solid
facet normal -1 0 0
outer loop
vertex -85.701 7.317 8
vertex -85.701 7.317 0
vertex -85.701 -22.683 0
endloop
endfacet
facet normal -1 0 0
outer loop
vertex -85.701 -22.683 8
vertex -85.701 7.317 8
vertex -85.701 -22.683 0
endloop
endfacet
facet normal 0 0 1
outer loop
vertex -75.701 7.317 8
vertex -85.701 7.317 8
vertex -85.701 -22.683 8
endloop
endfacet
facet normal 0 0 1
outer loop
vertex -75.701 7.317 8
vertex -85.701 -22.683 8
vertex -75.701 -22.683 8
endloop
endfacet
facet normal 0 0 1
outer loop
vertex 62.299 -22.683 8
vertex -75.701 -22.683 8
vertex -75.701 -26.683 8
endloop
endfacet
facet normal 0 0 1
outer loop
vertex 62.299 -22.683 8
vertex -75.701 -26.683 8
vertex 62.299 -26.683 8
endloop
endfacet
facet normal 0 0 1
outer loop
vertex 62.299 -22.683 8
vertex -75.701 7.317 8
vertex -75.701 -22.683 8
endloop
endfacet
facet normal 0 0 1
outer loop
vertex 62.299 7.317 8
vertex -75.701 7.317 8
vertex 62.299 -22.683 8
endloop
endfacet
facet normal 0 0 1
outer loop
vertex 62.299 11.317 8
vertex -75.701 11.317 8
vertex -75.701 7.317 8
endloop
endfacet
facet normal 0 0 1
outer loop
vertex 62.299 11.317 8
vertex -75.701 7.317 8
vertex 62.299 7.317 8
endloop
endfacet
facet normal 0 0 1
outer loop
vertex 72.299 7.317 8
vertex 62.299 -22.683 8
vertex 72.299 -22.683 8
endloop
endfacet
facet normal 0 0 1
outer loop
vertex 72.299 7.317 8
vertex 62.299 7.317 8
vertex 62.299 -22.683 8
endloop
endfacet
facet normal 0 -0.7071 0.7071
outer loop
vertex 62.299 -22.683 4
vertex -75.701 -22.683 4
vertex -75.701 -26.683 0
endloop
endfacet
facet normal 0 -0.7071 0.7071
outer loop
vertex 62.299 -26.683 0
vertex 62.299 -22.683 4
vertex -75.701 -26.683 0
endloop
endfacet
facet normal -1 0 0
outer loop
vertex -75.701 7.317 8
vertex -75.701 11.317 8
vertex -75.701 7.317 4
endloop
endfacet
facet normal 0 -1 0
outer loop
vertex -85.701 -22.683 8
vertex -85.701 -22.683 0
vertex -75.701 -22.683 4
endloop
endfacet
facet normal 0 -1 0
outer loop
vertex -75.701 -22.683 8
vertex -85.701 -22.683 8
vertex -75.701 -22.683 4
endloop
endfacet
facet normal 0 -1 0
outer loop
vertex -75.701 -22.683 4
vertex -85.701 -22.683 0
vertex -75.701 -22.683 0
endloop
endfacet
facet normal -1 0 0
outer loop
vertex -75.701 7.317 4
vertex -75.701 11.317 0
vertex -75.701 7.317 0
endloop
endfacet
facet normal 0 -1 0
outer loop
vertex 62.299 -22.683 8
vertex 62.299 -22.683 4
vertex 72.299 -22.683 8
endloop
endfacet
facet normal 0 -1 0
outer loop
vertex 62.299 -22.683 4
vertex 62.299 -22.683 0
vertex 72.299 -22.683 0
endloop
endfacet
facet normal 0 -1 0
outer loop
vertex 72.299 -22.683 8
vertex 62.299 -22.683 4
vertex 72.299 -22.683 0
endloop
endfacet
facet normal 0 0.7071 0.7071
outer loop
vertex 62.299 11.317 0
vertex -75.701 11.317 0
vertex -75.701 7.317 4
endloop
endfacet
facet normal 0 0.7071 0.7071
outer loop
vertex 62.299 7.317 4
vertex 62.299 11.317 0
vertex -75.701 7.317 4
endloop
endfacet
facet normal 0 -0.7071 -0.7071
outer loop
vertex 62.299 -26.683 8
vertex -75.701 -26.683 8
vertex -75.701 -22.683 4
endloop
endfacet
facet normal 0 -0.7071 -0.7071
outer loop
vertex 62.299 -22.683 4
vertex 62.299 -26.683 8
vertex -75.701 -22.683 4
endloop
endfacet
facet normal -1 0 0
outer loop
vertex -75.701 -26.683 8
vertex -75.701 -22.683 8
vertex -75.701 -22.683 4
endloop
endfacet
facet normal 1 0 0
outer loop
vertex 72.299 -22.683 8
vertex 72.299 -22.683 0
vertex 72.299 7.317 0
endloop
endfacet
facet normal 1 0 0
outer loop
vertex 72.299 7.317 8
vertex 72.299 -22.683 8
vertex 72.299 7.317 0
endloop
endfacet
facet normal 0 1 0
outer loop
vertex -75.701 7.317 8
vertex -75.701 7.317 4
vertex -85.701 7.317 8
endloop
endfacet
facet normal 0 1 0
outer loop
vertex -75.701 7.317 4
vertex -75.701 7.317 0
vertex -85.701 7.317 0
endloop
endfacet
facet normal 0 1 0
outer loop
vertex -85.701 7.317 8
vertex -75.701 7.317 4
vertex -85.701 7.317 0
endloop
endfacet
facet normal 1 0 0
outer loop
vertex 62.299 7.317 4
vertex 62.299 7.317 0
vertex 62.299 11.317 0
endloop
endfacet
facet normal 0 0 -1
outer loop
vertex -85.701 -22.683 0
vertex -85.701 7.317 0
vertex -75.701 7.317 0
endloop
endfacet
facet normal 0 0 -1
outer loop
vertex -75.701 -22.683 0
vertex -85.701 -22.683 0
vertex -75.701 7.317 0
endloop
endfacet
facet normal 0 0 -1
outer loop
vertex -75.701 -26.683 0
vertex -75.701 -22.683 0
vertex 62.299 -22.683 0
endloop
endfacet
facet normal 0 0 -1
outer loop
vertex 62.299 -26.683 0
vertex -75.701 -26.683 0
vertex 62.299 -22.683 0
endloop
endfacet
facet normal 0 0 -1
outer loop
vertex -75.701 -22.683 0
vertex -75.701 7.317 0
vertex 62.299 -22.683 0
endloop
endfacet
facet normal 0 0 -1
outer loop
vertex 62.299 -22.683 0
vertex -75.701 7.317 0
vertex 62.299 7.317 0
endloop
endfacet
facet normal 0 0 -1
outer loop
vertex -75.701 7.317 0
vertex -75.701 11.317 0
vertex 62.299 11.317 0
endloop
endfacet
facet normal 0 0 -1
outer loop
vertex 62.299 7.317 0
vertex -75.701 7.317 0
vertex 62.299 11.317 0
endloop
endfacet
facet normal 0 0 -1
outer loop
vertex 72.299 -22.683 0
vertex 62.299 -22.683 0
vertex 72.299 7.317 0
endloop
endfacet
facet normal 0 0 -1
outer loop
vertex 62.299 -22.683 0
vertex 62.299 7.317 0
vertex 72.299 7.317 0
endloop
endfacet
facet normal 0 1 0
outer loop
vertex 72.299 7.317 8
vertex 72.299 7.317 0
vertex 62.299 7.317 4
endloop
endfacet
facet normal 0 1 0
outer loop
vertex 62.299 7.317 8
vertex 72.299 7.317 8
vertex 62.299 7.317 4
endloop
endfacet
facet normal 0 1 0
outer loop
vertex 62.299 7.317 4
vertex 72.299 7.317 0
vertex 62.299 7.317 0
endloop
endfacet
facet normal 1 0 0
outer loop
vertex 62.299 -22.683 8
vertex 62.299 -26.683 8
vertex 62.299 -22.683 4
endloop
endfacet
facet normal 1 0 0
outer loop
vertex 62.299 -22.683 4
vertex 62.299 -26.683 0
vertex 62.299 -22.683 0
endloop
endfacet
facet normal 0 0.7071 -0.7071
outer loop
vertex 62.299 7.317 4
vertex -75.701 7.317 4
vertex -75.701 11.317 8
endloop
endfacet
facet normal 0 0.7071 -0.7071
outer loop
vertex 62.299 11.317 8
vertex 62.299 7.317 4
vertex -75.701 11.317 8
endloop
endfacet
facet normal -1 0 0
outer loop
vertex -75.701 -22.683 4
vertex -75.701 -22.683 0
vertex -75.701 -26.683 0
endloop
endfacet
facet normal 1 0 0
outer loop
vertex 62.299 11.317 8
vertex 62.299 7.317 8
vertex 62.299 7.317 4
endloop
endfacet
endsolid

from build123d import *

# Parameters (mm, degrees)
F1_DEPTH = 8
F4_DEPTH = 148.001


with BuildPart() as f1:
    # F0 (on Top) → F1 (new body)
    with BuildSketch(Plane.XY):
        Polygon((-75.700524, 7.317285), (-85.700524, 7.317285), (-85.700524, -22.682715), (-75.700524, -22.682715), (-75.700524, -26.682715), (62.299476, -26.682715), (62.299476, -22.682715), (72.299476, -22.682715), (72.299476, 7.317285), (62.299476, 7.317285), (62.299476, 11.317285), (-75.700524, 11.317285), align=None)
    extrude(amount=F1_DEPTH)

    # F2 (on face) + F3 (on face) → F4 (cut, through all)
    with BuildSketch(Plane(origin=(-75.700524, 0, 0), x_dir=(0, -1, 0), z_dir=(-1, 0, 0))):
        Polygon((22.682715, 4), (26.682715, 0), (26.682715, 8), align=None)
    with BuildSketch(Plane(origin=(-75.700524, 0, 0), x_dir=(0, -1, 0), z_dir=(-1, 0, 0))):
        Polygon((-7.317285, 4), (-11.317285, 8), (-11.317285, 0), align=None)
    extrude(amount=-F4_DEPTH, mode=Mode.SUBTRACT)


solid = f1.part
